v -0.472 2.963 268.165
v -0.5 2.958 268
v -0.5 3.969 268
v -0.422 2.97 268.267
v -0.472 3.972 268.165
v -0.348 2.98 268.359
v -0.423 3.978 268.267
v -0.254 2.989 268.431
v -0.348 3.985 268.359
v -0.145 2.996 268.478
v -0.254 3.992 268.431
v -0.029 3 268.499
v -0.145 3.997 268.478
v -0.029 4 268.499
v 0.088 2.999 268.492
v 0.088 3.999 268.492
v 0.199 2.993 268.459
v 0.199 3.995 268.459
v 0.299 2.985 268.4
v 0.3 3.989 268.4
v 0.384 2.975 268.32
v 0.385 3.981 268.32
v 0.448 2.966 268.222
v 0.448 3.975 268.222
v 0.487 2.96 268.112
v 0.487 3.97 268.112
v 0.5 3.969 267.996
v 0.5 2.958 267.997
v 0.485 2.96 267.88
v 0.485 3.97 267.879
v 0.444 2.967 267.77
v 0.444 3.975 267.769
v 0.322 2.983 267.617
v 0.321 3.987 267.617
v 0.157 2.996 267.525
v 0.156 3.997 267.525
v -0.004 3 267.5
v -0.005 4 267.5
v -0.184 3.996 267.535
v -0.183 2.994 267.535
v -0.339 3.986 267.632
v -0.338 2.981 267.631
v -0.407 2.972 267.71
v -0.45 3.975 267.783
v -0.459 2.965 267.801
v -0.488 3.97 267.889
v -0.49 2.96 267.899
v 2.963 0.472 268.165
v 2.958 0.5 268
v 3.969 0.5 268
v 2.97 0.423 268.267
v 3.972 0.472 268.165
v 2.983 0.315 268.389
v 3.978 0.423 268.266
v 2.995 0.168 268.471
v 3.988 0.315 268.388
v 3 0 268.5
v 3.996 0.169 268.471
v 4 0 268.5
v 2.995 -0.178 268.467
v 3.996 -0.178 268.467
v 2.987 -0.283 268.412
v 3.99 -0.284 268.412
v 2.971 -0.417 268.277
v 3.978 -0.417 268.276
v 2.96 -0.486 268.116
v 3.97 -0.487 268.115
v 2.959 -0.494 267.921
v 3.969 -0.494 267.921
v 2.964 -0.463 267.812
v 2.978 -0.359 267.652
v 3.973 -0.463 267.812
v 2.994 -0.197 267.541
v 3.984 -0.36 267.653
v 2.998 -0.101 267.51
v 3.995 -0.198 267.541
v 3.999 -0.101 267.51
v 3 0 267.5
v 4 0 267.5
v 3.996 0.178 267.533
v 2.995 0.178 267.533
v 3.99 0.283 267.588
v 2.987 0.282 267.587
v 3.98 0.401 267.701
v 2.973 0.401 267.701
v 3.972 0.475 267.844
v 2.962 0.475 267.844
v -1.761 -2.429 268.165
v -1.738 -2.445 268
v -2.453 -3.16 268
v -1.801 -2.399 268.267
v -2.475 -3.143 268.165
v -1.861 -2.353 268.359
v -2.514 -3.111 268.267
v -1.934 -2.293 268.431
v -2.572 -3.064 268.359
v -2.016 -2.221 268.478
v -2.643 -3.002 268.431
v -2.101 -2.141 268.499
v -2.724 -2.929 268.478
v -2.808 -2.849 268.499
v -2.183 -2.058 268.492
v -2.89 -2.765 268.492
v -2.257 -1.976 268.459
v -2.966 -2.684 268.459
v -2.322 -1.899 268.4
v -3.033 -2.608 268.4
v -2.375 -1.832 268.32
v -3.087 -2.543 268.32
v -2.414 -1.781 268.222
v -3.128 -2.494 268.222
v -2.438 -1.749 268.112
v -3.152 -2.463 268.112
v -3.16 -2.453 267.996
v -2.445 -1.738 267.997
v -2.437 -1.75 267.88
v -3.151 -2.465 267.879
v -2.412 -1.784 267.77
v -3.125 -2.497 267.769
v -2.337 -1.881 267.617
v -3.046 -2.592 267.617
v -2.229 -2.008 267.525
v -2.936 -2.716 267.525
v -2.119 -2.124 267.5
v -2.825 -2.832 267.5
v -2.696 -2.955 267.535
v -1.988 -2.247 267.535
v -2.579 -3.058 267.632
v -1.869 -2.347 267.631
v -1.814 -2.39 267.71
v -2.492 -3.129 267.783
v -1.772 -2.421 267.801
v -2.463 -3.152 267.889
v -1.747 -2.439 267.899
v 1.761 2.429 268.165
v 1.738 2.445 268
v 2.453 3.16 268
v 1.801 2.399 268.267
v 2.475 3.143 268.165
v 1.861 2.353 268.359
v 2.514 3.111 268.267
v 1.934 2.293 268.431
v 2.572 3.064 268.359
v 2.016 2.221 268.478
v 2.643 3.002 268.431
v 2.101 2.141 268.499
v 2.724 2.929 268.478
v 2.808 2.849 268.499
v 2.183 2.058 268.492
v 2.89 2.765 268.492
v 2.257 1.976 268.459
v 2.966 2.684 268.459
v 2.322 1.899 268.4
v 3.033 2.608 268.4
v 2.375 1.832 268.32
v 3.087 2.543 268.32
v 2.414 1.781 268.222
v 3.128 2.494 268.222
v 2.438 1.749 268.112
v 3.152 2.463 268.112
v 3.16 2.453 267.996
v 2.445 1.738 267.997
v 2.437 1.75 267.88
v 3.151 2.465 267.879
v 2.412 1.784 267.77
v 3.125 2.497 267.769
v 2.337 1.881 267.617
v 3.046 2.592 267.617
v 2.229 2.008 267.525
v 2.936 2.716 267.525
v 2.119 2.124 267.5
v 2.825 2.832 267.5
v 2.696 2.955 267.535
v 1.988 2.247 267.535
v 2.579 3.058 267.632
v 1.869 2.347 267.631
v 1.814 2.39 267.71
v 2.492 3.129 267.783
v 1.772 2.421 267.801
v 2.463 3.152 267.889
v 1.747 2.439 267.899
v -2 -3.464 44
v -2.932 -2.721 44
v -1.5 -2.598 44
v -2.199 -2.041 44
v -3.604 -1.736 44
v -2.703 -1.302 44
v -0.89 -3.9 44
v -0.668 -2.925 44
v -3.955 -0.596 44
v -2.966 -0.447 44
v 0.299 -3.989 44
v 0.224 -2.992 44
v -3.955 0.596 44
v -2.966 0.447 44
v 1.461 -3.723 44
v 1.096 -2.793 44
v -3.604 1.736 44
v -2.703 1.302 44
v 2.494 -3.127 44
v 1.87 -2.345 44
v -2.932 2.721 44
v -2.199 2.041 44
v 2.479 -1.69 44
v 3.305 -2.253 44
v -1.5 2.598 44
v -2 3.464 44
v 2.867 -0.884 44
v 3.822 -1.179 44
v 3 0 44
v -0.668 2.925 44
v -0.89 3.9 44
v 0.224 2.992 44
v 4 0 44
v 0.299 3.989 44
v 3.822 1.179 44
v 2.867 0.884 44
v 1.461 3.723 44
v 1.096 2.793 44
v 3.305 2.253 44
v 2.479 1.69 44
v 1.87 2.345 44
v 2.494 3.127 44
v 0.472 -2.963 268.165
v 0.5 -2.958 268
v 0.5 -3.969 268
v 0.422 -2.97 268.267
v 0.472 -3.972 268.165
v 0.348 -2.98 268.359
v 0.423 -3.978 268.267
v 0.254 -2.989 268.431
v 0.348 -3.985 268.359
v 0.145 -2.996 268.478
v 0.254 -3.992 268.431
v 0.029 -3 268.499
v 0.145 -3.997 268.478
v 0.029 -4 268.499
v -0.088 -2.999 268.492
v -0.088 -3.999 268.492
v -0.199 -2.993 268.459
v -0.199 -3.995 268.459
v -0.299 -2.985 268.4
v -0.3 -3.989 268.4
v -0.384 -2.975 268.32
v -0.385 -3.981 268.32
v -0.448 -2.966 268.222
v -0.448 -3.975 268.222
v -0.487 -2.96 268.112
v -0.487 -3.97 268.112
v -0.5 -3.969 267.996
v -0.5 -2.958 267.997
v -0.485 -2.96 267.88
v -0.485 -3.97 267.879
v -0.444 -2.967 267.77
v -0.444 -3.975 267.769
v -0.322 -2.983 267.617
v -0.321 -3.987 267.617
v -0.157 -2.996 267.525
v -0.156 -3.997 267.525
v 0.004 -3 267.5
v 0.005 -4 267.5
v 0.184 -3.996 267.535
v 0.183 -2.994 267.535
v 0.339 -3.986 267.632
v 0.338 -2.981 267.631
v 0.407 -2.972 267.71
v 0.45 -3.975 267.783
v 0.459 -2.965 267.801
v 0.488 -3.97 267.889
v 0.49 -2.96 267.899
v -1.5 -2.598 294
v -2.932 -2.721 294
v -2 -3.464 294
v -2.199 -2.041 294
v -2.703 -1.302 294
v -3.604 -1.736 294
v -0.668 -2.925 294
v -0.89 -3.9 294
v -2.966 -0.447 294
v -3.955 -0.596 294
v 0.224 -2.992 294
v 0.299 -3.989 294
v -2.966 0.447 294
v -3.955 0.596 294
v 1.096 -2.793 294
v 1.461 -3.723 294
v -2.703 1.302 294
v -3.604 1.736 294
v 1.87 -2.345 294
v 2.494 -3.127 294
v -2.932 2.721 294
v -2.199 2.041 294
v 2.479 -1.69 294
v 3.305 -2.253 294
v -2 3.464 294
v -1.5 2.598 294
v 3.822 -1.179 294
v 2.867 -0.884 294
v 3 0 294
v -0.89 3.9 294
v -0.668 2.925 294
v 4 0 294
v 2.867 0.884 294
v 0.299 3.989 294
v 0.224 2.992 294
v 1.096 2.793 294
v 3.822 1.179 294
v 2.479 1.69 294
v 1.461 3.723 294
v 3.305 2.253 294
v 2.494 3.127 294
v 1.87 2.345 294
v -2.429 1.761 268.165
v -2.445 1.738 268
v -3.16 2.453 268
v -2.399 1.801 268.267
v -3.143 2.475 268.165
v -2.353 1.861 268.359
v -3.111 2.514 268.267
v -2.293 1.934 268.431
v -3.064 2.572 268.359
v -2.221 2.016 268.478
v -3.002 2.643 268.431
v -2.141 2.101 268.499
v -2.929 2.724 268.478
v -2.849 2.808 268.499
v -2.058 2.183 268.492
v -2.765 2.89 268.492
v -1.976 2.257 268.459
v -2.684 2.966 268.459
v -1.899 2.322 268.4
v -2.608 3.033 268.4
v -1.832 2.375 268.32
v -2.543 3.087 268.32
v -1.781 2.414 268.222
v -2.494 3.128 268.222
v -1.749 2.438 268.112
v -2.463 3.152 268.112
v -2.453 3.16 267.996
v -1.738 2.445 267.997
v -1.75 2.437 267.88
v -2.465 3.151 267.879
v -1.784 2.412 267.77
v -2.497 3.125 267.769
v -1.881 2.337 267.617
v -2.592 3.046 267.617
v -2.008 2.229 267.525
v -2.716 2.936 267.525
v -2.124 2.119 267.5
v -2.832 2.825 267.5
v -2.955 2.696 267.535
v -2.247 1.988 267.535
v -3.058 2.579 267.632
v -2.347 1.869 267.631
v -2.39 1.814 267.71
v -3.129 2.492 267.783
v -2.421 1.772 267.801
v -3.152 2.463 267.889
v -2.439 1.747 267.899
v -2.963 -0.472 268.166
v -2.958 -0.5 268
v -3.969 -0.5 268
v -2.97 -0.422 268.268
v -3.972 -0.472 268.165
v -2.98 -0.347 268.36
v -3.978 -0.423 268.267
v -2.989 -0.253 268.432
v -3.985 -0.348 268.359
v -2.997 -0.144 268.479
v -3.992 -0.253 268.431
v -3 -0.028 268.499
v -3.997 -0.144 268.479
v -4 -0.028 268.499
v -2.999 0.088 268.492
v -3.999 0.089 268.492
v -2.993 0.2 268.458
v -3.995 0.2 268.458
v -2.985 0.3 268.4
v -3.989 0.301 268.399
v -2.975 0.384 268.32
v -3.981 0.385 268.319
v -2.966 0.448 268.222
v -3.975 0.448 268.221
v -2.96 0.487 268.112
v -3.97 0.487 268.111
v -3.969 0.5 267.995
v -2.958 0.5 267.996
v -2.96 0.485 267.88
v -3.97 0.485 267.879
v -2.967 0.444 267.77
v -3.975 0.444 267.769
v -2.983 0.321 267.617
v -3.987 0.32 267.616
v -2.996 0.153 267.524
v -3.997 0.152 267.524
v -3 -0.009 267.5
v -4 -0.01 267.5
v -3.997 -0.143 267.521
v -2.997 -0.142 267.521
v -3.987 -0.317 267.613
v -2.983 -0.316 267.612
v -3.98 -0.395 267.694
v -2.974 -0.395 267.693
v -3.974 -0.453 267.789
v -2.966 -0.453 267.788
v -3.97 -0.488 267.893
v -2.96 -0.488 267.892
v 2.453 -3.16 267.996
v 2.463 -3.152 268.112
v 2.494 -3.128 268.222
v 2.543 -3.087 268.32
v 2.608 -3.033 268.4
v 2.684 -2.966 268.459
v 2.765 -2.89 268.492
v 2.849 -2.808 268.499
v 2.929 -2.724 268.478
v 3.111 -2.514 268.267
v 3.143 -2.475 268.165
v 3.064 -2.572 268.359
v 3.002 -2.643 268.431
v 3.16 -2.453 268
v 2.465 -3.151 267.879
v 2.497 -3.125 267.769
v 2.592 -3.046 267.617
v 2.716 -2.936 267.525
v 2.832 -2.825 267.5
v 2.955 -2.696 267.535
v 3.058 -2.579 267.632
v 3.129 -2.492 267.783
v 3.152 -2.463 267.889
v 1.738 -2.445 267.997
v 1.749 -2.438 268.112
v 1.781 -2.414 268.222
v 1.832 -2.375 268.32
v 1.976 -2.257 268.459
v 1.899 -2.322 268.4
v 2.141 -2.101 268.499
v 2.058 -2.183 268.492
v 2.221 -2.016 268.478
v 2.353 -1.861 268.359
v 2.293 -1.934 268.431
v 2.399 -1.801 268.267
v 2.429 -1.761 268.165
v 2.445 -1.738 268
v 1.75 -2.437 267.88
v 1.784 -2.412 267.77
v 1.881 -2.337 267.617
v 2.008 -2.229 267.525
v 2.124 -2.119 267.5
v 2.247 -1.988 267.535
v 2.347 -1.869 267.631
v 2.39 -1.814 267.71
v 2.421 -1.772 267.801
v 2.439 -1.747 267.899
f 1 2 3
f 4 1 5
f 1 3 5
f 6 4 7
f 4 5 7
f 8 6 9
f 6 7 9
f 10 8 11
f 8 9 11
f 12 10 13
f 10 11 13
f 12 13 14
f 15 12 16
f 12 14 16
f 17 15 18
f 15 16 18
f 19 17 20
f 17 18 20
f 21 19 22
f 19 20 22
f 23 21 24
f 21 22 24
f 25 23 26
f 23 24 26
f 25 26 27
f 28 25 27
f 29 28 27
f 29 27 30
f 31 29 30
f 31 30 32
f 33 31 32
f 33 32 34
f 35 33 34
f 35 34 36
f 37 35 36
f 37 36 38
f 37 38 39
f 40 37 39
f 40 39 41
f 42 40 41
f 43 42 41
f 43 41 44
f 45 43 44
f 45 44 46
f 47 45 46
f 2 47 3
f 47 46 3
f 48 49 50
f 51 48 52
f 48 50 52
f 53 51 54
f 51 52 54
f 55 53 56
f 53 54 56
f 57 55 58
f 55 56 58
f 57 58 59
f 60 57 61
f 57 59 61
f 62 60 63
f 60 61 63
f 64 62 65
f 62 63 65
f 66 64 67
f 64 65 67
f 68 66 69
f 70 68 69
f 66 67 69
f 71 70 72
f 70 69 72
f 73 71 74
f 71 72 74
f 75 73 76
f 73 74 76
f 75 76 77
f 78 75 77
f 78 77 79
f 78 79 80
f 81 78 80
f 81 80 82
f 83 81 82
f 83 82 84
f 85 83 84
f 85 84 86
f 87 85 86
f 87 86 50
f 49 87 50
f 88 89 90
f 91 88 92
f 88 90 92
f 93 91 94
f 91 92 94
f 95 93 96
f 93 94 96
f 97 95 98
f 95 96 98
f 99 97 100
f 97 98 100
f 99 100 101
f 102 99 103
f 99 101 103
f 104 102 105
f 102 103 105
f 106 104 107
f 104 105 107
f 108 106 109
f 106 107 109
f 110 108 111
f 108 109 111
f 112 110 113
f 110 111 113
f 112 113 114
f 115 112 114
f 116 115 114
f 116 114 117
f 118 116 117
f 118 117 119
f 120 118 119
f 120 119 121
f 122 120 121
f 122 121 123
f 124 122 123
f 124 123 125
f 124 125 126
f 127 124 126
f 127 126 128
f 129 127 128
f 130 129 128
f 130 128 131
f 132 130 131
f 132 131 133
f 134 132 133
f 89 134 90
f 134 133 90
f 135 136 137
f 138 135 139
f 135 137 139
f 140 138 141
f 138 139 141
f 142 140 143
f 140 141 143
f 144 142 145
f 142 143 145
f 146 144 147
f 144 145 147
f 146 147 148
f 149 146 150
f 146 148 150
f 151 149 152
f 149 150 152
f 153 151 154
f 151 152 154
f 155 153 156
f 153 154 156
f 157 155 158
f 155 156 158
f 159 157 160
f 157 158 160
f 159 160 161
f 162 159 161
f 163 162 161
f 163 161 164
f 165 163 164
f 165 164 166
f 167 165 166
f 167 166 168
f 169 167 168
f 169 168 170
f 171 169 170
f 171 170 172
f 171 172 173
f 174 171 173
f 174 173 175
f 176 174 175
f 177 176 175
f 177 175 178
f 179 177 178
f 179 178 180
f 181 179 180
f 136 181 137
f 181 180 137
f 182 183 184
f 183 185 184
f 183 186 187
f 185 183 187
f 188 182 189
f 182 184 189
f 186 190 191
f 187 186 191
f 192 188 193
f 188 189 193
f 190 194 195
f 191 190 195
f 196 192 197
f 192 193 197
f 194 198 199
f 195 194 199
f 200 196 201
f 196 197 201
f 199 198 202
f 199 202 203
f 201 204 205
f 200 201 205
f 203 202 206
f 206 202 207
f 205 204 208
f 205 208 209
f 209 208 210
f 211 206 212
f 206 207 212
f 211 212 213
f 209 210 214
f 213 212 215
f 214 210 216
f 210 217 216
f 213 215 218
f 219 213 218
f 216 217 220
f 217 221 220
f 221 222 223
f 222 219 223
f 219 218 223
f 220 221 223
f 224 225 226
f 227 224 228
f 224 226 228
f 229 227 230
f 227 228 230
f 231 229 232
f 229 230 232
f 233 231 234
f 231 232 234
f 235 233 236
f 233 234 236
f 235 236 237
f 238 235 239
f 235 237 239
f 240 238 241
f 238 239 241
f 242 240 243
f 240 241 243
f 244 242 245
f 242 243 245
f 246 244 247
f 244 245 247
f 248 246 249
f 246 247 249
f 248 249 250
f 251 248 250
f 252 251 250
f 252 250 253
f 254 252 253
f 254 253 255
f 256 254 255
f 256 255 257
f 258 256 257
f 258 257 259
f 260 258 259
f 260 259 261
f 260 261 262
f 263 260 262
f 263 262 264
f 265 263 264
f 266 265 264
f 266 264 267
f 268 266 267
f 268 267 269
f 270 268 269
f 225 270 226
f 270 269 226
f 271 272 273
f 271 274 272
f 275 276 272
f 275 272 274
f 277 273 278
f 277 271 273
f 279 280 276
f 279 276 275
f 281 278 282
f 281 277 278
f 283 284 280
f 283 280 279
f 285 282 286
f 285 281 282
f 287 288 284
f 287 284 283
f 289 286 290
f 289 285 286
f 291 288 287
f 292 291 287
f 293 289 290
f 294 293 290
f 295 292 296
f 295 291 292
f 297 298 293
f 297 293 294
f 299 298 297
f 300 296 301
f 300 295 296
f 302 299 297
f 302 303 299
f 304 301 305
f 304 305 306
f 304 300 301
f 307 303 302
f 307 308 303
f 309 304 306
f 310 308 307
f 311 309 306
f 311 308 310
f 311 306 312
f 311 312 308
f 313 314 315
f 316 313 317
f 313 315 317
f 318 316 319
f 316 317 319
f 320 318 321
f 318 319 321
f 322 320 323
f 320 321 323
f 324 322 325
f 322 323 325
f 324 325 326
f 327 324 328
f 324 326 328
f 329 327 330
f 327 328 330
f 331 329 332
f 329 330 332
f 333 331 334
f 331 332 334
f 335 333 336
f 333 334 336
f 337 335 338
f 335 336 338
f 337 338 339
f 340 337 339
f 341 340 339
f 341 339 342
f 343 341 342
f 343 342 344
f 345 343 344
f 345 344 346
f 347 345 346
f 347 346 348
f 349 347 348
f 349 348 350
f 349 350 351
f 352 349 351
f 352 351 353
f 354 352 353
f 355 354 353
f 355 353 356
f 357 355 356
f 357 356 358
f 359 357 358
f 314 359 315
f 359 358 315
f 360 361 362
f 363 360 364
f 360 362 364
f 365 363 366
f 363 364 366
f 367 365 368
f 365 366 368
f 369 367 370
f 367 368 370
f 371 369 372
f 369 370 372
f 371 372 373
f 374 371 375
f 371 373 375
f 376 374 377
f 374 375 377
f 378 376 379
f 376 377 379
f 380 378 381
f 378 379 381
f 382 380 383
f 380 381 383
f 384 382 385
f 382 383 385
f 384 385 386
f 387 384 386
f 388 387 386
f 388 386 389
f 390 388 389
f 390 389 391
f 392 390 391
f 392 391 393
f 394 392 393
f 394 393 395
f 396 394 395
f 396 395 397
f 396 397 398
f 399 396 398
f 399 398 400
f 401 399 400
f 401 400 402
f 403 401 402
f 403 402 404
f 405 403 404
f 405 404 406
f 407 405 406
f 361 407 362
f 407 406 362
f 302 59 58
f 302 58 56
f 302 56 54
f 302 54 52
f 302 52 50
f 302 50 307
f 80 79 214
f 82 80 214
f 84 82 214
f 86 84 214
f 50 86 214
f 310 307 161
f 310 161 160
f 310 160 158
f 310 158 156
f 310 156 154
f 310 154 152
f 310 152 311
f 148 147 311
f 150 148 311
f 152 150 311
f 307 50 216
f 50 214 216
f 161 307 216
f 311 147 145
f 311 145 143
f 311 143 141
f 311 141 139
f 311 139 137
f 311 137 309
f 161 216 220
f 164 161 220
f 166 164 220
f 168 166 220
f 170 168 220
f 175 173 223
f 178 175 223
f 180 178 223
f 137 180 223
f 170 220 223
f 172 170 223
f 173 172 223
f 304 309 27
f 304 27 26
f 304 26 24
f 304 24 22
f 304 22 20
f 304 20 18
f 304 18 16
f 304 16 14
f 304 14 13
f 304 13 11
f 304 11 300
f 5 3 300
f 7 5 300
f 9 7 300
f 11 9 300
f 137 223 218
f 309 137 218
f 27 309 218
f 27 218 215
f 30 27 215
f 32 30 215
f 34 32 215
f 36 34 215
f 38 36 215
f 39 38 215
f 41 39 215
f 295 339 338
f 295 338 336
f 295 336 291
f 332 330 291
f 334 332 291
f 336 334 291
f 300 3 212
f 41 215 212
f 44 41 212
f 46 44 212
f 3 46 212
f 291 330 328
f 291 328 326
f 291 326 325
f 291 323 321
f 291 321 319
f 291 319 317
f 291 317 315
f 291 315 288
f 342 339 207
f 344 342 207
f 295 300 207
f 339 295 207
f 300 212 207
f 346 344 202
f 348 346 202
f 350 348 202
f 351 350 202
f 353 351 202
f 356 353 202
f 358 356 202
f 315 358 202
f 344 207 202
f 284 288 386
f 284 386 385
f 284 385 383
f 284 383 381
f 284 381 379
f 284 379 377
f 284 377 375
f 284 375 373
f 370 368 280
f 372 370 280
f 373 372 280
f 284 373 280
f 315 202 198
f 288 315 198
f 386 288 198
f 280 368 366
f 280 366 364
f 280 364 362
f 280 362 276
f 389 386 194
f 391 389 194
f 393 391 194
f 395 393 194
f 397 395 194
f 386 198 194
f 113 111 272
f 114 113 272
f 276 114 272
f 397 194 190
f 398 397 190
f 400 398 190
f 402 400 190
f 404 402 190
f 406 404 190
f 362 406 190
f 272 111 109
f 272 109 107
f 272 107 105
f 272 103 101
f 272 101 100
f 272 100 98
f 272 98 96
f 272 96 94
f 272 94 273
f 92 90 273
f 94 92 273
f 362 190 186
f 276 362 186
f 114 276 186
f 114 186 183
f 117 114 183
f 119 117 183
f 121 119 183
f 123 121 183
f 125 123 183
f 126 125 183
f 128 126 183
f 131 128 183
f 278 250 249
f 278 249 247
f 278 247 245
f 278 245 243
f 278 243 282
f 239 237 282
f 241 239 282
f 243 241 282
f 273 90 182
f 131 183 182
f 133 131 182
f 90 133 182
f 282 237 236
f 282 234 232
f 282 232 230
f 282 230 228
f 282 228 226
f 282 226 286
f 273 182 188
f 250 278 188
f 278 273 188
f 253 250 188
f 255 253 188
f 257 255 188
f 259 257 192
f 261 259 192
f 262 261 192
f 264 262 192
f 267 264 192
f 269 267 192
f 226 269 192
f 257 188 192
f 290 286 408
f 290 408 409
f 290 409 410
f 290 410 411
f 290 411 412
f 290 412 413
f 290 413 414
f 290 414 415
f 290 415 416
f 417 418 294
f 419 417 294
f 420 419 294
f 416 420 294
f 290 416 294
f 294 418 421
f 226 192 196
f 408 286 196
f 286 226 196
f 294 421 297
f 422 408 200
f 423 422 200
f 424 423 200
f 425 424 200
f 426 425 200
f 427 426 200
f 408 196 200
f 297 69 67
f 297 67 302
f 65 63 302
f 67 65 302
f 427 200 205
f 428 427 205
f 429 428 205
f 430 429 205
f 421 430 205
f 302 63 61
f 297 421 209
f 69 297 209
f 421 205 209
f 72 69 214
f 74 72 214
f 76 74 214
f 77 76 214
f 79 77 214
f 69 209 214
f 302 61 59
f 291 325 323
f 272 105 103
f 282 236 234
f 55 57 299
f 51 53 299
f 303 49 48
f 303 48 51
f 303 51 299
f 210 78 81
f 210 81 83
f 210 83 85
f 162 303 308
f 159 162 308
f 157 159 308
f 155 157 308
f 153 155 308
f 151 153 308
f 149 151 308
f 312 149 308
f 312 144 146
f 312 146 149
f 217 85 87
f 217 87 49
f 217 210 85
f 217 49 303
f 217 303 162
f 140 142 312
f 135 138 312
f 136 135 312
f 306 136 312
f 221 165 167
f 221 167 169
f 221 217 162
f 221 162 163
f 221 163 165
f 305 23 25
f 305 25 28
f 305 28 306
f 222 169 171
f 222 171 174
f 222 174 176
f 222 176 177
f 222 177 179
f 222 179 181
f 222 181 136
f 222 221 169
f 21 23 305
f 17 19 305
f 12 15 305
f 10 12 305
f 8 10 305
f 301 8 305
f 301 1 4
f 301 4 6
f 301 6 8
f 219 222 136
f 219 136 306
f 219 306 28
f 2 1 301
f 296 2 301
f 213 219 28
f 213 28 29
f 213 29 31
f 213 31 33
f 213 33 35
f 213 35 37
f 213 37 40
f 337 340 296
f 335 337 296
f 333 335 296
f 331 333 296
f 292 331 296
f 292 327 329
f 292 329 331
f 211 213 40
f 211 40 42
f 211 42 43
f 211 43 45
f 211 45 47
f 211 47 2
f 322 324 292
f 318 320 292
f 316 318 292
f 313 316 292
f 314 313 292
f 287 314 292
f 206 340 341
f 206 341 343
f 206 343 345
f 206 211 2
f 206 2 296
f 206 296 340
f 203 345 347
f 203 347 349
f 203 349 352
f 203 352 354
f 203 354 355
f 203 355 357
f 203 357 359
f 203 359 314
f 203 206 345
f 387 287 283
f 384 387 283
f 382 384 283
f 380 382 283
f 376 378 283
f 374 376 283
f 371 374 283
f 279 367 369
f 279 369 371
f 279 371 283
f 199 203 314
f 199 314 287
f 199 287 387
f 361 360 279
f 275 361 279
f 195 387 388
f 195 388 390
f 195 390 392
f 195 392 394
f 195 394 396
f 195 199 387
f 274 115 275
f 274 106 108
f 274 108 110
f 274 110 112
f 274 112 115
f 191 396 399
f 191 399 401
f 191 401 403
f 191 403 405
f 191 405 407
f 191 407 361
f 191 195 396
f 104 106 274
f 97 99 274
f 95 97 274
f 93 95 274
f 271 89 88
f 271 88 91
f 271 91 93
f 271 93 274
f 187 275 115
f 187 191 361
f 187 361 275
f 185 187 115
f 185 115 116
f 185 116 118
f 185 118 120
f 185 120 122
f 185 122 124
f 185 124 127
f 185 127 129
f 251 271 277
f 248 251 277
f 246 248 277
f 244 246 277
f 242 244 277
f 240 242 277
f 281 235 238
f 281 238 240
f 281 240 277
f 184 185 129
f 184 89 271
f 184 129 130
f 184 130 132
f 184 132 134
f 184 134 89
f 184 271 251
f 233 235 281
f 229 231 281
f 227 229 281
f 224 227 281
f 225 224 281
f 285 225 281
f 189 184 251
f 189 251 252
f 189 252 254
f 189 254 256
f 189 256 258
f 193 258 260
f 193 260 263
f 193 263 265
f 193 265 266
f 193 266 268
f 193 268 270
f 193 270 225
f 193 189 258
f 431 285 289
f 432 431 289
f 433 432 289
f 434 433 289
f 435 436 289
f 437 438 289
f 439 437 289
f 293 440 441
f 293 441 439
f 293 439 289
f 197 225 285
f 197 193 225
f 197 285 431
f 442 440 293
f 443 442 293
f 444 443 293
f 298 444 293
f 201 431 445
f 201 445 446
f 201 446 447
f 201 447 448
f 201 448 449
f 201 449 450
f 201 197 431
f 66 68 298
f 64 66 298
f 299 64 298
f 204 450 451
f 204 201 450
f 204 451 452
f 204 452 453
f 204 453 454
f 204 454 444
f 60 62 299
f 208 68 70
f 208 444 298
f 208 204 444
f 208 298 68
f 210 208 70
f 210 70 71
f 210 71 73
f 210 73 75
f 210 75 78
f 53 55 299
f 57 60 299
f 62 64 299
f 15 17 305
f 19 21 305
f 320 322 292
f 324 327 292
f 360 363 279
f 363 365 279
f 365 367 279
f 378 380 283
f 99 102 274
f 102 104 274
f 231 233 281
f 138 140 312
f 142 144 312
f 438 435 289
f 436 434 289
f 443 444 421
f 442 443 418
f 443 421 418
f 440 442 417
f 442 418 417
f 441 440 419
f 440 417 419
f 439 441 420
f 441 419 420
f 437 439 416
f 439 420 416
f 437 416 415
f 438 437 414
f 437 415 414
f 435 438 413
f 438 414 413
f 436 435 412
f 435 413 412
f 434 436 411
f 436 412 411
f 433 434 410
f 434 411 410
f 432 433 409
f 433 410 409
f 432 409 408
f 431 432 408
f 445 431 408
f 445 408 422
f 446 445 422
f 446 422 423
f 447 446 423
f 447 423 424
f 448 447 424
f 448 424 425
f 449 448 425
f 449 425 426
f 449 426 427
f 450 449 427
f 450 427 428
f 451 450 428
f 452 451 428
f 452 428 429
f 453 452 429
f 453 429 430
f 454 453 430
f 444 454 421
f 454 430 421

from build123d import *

# Parameters (mm, degrees)
SKETCH_R           = 4
SKETCH_R_2         = 3
PAD_DEPTH          = 250
SKETCH001_W        = 5
SKETCH001_H        = 5
PAD001_DEPTH       = 10
SKETCH002_R        = 0.5
POCKET_DEPTH       = 3
POLARPATTERN_COUNT = 8
SKETCH003_W        = 8.429369
SKETCH003_H        = 7.155477
POCKET001_DEPTH    = 10


with BuildPart() as part:
    # Sketch → Pad (new body)
    with BuildSketch(Plane.XY.offset(44)):
        Circle(SKETCH_R)
        Circle(SKETCH_R_2, mode=Mode.SUBTRACT)
    extrude(amount=PAD_DEPTH)

    # Sketch001 → Pad001 (new body)
    with BuildSketch(Plane.XY.offset(294)):
        with Locations((2.5, -2.5)):
            Rectangle(SKETCH001_W, SKETCH001_H)
    extrude(amount=PAD001_DEPTH)

    # Sketch002 → Pocket (cut)
    with BuildSketch(Plane(origin=(0, -5, 44), x_dir=(1, 0, 0), z_dir=(0, -1, 0))):
        with Locations((0, 224)):
            Circle(SKETCH002_R)
    pocket = extrude(amount=-POCKET_DEPTH, mode=Mode.SUBTRACT)

    # PolarPattern: Pocket ×8 about axis
    polarpattern_axis = Axis((0, 0, 299), (0, 0, 1))
    for i in range(1, POLARPATTERN_COUNT):
        add(pocket.rotate(polarpattern_axis, i * 360 / POLARPATTERN_COUNT), mode=Mode.SUBTRACT)

    # Sketch003 → Pocket001 (cut)
    with BuildSketch(Plane.XY.offset(304)):
        with Locations((3.121665, -2.696092)):
            Rectangle(SKETCH003_W, SKETCH003_H)
    extrude(amount=-POCKET001_DEPTH, mode=Mode.SUBTRACT)


solid = part.part
